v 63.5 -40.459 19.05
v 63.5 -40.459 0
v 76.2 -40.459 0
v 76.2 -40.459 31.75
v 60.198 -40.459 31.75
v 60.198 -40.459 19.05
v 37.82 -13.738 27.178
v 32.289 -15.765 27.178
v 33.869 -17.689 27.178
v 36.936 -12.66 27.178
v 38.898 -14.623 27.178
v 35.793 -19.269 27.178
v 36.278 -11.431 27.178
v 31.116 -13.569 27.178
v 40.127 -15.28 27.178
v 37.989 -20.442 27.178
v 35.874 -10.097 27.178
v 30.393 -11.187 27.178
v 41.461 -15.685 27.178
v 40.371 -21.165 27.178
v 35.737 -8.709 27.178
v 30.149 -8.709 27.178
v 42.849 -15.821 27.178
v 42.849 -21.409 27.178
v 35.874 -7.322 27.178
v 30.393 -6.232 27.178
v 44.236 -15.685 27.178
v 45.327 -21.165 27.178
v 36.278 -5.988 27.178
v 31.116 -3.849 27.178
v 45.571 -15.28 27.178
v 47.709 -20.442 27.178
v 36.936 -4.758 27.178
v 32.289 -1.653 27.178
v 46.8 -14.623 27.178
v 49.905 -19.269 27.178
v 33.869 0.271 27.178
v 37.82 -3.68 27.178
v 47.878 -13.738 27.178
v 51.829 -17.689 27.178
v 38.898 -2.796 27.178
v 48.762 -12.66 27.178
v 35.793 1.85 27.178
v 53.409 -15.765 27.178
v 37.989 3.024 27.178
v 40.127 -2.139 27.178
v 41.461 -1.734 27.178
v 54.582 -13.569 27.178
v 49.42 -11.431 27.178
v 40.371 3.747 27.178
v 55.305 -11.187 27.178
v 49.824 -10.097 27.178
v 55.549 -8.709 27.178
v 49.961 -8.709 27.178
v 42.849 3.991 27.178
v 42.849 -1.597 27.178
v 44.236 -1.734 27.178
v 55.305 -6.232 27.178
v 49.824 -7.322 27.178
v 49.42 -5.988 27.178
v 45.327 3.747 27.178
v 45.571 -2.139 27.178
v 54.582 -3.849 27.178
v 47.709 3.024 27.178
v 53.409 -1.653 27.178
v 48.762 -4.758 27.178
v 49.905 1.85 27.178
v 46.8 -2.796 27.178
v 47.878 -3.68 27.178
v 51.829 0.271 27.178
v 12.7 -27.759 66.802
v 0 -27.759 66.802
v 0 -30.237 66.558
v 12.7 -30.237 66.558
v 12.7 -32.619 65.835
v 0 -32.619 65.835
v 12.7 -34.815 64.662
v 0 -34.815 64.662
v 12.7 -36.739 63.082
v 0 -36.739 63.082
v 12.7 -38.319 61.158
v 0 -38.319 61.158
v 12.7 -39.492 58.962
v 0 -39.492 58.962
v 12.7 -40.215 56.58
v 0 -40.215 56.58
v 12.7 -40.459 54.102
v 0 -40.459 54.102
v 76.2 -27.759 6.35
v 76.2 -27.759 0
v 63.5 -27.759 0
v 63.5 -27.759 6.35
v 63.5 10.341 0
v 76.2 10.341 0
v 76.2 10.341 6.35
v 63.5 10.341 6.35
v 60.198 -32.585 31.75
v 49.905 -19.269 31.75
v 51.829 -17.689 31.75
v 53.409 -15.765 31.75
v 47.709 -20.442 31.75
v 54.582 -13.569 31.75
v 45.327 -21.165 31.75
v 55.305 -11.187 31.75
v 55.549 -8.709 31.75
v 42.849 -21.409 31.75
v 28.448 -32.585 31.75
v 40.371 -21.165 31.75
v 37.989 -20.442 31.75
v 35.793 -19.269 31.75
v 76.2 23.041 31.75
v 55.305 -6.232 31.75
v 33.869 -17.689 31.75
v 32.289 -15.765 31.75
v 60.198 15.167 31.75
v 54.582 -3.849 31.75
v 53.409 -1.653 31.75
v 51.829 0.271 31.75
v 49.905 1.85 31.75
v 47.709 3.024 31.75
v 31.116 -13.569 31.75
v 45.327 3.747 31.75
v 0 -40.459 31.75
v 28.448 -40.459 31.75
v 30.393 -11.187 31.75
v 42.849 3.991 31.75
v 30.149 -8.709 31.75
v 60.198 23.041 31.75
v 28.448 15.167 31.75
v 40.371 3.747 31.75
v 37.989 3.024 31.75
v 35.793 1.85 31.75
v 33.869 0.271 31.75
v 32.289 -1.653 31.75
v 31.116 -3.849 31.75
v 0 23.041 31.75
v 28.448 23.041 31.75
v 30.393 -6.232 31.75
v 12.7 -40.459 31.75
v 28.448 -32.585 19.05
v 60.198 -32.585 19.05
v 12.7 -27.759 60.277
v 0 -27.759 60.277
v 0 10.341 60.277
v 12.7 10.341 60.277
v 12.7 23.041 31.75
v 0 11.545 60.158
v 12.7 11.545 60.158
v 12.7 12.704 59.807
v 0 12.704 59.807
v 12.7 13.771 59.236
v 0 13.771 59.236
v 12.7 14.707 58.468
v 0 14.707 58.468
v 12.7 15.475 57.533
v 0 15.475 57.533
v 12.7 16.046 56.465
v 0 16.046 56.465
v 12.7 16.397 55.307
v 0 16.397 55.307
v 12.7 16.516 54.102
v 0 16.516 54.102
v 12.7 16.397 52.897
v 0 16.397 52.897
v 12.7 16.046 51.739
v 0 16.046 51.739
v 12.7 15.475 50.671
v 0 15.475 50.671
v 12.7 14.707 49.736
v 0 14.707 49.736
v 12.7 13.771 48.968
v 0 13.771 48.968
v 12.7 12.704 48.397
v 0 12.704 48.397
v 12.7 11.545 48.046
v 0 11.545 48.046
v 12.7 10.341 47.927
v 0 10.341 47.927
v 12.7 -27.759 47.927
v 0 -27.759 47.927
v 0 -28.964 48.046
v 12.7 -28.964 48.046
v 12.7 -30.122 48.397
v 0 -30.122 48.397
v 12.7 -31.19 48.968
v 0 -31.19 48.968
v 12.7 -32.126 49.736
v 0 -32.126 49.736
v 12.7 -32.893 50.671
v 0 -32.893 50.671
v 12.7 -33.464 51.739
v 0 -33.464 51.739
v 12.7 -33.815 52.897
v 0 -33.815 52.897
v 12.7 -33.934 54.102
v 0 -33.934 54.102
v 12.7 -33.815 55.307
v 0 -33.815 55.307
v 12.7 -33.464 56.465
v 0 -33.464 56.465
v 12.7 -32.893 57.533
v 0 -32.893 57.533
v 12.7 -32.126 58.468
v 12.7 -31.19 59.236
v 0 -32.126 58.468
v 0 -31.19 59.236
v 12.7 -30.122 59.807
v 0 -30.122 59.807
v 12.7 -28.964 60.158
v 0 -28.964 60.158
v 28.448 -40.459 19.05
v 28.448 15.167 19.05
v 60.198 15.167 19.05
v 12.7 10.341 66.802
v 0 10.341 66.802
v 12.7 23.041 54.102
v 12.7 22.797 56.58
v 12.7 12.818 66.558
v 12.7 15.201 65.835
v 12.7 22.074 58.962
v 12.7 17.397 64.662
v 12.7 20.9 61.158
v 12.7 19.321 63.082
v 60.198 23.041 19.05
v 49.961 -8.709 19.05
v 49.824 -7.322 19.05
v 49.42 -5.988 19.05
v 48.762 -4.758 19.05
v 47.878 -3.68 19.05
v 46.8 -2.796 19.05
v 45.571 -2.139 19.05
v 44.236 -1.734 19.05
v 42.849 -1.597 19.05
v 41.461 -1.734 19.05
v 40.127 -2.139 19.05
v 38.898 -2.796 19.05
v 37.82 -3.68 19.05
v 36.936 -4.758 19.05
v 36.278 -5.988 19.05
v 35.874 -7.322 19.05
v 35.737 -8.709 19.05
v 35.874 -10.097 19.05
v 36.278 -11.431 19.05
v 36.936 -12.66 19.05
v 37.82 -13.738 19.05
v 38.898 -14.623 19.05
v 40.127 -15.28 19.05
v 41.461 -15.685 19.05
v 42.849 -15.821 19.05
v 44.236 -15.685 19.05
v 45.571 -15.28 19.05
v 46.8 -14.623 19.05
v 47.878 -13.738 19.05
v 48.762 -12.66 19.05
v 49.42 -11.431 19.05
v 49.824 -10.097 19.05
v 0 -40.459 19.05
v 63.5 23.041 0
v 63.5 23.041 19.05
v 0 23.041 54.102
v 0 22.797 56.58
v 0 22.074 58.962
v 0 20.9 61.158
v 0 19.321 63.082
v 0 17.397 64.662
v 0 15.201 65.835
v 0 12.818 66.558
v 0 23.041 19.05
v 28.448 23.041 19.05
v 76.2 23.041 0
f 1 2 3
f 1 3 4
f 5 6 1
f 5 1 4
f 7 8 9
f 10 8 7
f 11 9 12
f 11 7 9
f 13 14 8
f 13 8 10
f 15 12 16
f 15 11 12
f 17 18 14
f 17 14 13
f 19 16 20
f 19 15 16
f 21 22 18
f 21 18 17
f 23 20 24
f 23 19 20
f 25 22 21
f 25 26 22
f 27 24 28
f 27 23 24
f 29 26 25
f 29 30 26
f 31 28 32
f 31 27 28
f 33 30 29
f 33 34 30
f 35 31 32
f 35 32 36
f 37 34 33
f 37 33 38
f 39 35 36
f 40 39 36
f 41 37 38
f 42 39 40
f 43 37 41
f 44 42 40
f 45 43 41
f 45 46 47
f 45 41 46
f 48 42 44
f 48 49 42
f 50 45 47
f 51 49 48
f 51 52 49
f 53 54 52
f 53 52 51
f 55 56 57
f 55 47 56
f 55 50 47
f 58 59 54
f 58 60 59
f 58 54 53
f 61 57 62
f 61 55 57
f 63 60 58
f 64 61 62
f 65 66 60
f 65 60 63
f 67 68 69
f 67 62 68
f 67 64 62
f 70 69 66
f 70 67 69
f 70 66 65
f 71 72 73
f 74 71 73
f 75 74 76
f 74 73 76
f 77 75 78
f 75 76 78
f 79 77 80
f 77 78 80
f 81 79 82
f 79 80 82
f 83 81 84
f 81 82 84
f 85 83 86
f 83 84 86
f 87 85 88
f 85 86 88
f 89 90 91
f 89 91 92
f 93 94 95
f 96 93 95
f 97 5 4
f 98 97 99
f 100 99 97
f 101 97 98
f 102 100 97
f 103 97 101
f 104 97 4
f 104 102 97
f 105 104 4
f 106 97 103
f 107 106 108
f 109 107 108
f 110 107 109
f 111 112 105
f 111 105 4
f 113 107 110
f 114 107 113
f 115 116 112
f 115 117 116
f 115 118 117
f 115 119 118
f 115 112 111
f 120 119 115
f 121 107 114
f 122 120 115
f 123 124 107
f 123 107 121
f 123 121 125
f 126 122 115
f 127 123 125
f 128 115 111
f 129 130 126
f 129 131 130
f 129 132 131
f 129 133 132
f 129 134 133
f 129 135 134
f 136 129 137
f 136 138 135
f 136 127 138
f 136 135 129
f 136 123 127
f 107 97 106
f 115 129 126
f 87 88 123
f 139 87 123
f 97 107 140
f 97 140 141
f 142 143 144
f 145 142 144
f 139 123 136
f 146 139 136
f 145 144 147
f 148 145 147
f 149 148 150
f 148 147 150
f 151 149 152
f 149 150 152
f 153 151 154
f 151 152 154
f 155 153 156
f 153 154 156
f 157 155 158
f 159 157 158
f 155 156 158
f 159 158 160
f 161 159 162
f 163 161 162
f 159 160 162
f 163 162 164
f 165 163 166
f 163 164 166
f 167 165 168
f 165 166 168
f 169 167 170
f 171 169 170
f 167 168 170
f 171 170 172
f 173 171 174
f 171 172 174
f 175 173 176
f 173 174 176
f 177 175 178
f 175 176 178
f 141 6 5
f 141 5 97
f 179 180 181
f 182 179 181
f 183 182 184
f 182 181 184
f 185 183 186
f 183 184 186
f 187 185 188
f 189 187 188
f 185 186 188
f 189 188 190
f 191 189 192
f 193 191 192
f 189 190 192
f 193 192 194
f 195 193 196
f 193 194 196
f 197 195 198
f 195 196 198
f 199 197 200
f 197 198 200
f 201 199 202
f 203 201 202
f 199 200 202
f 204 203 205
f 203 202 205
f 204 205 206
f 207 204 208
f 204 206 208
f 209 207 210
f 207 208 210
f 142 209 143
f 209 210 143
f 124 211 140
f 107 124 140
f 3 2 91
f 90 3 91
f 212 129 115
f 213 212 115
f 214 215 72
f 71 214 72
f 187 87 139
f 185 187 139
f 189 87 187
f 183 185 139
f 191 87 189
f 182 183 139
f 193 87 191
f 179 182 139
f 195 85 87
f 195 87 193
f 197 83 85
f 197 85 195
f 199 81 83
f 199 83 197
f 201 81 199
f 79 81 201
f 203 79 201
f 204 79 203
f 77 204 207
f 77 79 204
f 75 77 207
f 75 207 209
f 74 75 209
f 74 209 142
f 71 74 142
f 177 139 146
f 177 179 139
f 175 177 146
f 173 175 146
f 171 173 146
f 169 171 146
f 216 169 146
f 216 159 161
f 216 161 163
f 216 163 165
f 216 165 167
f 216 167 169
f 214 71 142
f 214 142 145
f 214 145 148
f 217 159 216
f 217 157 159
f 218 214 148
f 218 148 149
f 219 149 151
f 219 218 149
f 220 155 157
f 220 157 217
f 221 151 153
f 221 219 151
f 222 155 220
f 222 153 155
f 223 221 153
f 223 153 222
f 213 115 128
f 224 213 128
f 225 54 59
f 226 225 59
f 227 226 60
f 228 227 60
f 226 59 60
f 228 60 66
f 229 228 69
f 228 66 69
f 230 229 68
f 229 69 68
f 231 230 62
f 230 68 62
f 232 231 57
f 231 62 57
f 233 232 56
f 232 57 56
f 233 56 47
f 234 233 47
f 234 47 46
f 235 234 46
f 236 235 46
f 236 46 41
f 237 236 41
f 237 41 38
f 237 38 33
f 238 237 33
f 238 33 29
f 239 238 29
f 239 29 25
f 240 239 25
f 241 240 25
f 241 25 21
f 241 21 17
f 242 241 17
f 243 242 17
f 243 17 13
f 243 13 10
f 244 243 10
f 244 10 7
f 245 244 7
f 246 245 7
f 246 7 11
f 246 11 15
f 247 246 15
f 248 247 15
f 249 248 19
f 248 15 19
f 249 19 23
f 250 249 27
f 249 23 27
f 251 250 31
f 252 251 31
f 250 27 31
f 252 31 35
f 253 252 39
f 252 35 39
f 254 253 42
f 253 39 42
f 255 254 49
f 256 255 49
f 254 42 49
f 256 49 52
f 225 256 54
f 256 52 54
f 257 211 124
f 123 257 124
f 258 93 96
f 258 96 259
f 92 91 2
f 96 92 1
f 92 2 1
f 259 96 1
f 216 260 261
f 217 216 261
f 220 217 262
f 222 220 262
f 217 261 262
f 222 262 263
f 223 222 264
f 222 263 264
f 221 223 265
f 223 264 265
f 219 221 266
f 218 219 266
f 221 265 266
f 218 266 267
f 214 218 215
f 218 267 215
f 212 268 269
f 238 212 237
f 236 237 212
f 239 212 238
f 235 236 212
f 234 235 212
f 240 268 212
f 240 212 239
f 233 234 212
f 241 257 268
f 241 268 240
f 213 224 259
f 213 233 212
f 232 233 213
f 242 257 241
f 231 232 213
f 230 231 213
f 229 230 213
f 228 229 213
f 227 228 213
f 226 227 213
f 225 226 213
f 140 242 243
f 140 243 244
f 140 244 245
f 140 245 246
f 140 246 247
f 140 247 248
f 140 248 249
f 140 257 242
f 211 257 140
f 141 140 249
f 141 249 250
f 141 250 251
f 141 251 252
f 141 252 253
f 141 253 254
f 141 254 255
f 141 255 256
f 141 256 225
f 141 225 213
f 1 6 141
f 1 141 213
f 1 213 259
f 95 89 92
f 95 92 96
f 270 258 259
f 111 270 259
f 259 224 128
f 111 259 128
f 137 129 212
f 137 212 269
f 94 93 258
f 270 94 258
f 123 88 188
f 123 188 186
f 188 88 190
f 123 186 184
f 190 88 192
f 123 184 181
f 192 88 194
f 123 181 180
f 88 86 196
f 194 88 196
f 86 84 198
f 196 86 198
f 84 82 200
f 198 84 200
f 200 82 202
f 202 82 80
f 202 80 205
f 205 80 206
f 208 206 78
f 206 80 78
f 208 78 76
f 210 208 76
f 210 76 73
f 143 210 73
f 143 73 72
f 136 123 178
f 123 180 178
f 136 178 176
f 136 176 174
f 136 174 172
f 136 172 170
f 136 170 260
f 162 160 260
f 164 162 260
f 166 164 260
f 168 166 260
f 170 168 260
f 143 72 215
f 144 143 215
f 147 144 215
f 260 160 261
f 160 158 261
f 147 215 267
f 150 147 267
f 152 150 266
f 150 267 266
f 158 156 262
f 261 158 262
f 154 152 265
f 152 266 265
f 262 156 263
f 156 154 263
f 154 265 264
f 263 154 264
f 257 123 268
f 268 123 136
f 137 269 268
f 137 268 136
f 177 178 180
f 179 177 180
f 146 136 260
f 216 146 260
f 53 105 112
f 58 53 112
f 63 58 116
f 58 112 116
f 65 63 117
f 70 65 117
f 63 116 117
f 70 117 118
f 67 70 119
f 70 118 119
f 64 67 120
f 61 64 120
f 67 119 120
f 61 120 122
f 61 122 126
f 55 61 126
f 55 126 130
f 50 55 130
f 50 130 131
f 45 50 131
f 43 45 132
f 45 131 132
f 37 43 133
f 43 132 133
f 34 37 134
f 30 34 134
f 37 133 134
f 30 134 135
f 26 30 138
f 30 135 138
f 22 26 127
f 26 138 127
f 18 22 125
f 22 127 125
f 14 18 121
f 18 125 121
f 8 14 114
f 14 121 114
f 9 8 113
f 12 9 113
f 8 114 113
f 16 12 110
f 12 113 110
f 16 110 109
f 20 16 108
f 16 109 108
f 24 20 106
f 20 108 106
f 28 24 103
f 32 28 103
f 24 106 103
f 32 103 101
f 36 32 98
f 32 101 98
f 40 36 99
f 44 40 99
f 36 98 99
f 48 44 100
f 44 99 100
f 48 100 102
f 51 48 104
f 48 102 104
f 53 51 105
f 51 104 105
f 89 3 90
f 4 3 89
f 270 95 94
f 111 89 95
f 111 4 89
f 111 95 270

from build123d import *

# Parameters (mm, degrees)
F0_W       = 63.5
F0_H       = 31.75
F1_DEPTH   = 76.2
F2_DEPTH   = 12.7
F3_W       = 38.1
F3_H       = 6.35
F4_DEPTH   = 76.201
F6_W       = 63.5
F6_H       = 19.05
F7_DEPTH   = 63.5
F5_W       = 31.75
F5_H       = 7.874
F8_DEPTH   = 25.4
F9_R       = 12.7
F9_R_2     = 7.112
F10_DEPTH  = 4.572
F10_FACE_R = 7.112
F11_DEPTH  = 25.4


with BuildPart() as f1:
    # F0 (on Right) → F1 (new body)
    with BuildSketch(Plane.YZ):
        with Locations((-8.70918, 15.875)):
            Rectangle(F0_W, F0_H)
    extrude(amount=F1_DEPTH)

    # F3 (on face) → F4 (cut, through all)
    with BuildSketch(Plane.YZ.offset(76.2)):
        with Locations((-8.70918, 3.175)):
            Rectangle(F3_W, F3_H)
    extrude(amount=-F4_DEPTH, mode=Mode.SUBTRACT)

    # F6 (on face) → F7 (cut)
    with BuildSketch(Plane.XZ.offset(40.45918)):
        with Locations((31.75, 9.525)):
            Rectangle(F6_W, F6_H)
    extrude(amount=-F7_DEPTH, mode=Mode.SUBTRACT)

    # F5 (on face) → F8 (cut)
    with BuildSketch(Plane.XY.offset(31.75)):
        with Locations((44.323, -36.52218)):
            Rectangle(F5_W, F5_H)
        with Locations((44.323, 19.10382)):
            Rectangle(F5_W, F5_H)
    extrude(amount=-F8_DEPTH, mode=Mode.SUBTRACT)

    # F9 (on face) → F10 (cut)
    with BuildSketch(Plane.XY.offset(31.75)):
        with Locations((42.84896, -8.70918)):
            Circle(F9_R)
        with Locations((42.84896, -8.70918)):
            Circle(F9_R_2, mode=Mode.SUBTRACT)
    extrude(amount=-F10_DEPTH, mode=Mode.SUBTRACT)

    # F10_face (on face) → F11 (cut)
    with BuildSketch(Plane(origin=(42.84896, -8.70918, 31.75), x_dir=(1, 0, 0), z_dir=(0, 0, 1))):
        Circle(F10_FACE_R)
    extrude(amount=-F11_DEPTH, mode=Mode.SUBTRACT)


with BuildPart() as f2:
    # F0 (on Right) → F2 (new body)
    with BuildSketch(Plane.YZ):
        with BuildLine():
            Line((-40.45918, 54.102), (-40.45918, 31.75))
            Line((-40.45918, 31.75), (23.04082, 31.75))
            Line((23.04082, 31.75), (23.04082, 54.102))
            ThreePointArc((23.04082, 54.102), (19.321077, 63.082256), (10.34082, 66.802))
            Line((10.34082, 66.802), (-27.75918, 66.802))
            ThreePointArc((-27.75918, 66.802), (-36.739436, 63.082256), (-40.45918, 54.102))
        make_face()
        with BuildLine():
            ThreePointArc((-27.75918, 47.927062), (-33.934118, 54.102), (-27.75918, 60.276938))
            Line((-27.75918, 60.276938), (10.34082, 60.276938))
            ThreePointArc((10.34082, 60.276938), (16.515758, 54.102), (10.34082, 47.927062))
            Line((10.34082, 47.927062), (-27.75918, 47.927062))
        make_face(mode=Mode.SUBTRACT)
    extrude(amount=F2_DEPTH)


solid = Compound([f1.part, f2.part])
